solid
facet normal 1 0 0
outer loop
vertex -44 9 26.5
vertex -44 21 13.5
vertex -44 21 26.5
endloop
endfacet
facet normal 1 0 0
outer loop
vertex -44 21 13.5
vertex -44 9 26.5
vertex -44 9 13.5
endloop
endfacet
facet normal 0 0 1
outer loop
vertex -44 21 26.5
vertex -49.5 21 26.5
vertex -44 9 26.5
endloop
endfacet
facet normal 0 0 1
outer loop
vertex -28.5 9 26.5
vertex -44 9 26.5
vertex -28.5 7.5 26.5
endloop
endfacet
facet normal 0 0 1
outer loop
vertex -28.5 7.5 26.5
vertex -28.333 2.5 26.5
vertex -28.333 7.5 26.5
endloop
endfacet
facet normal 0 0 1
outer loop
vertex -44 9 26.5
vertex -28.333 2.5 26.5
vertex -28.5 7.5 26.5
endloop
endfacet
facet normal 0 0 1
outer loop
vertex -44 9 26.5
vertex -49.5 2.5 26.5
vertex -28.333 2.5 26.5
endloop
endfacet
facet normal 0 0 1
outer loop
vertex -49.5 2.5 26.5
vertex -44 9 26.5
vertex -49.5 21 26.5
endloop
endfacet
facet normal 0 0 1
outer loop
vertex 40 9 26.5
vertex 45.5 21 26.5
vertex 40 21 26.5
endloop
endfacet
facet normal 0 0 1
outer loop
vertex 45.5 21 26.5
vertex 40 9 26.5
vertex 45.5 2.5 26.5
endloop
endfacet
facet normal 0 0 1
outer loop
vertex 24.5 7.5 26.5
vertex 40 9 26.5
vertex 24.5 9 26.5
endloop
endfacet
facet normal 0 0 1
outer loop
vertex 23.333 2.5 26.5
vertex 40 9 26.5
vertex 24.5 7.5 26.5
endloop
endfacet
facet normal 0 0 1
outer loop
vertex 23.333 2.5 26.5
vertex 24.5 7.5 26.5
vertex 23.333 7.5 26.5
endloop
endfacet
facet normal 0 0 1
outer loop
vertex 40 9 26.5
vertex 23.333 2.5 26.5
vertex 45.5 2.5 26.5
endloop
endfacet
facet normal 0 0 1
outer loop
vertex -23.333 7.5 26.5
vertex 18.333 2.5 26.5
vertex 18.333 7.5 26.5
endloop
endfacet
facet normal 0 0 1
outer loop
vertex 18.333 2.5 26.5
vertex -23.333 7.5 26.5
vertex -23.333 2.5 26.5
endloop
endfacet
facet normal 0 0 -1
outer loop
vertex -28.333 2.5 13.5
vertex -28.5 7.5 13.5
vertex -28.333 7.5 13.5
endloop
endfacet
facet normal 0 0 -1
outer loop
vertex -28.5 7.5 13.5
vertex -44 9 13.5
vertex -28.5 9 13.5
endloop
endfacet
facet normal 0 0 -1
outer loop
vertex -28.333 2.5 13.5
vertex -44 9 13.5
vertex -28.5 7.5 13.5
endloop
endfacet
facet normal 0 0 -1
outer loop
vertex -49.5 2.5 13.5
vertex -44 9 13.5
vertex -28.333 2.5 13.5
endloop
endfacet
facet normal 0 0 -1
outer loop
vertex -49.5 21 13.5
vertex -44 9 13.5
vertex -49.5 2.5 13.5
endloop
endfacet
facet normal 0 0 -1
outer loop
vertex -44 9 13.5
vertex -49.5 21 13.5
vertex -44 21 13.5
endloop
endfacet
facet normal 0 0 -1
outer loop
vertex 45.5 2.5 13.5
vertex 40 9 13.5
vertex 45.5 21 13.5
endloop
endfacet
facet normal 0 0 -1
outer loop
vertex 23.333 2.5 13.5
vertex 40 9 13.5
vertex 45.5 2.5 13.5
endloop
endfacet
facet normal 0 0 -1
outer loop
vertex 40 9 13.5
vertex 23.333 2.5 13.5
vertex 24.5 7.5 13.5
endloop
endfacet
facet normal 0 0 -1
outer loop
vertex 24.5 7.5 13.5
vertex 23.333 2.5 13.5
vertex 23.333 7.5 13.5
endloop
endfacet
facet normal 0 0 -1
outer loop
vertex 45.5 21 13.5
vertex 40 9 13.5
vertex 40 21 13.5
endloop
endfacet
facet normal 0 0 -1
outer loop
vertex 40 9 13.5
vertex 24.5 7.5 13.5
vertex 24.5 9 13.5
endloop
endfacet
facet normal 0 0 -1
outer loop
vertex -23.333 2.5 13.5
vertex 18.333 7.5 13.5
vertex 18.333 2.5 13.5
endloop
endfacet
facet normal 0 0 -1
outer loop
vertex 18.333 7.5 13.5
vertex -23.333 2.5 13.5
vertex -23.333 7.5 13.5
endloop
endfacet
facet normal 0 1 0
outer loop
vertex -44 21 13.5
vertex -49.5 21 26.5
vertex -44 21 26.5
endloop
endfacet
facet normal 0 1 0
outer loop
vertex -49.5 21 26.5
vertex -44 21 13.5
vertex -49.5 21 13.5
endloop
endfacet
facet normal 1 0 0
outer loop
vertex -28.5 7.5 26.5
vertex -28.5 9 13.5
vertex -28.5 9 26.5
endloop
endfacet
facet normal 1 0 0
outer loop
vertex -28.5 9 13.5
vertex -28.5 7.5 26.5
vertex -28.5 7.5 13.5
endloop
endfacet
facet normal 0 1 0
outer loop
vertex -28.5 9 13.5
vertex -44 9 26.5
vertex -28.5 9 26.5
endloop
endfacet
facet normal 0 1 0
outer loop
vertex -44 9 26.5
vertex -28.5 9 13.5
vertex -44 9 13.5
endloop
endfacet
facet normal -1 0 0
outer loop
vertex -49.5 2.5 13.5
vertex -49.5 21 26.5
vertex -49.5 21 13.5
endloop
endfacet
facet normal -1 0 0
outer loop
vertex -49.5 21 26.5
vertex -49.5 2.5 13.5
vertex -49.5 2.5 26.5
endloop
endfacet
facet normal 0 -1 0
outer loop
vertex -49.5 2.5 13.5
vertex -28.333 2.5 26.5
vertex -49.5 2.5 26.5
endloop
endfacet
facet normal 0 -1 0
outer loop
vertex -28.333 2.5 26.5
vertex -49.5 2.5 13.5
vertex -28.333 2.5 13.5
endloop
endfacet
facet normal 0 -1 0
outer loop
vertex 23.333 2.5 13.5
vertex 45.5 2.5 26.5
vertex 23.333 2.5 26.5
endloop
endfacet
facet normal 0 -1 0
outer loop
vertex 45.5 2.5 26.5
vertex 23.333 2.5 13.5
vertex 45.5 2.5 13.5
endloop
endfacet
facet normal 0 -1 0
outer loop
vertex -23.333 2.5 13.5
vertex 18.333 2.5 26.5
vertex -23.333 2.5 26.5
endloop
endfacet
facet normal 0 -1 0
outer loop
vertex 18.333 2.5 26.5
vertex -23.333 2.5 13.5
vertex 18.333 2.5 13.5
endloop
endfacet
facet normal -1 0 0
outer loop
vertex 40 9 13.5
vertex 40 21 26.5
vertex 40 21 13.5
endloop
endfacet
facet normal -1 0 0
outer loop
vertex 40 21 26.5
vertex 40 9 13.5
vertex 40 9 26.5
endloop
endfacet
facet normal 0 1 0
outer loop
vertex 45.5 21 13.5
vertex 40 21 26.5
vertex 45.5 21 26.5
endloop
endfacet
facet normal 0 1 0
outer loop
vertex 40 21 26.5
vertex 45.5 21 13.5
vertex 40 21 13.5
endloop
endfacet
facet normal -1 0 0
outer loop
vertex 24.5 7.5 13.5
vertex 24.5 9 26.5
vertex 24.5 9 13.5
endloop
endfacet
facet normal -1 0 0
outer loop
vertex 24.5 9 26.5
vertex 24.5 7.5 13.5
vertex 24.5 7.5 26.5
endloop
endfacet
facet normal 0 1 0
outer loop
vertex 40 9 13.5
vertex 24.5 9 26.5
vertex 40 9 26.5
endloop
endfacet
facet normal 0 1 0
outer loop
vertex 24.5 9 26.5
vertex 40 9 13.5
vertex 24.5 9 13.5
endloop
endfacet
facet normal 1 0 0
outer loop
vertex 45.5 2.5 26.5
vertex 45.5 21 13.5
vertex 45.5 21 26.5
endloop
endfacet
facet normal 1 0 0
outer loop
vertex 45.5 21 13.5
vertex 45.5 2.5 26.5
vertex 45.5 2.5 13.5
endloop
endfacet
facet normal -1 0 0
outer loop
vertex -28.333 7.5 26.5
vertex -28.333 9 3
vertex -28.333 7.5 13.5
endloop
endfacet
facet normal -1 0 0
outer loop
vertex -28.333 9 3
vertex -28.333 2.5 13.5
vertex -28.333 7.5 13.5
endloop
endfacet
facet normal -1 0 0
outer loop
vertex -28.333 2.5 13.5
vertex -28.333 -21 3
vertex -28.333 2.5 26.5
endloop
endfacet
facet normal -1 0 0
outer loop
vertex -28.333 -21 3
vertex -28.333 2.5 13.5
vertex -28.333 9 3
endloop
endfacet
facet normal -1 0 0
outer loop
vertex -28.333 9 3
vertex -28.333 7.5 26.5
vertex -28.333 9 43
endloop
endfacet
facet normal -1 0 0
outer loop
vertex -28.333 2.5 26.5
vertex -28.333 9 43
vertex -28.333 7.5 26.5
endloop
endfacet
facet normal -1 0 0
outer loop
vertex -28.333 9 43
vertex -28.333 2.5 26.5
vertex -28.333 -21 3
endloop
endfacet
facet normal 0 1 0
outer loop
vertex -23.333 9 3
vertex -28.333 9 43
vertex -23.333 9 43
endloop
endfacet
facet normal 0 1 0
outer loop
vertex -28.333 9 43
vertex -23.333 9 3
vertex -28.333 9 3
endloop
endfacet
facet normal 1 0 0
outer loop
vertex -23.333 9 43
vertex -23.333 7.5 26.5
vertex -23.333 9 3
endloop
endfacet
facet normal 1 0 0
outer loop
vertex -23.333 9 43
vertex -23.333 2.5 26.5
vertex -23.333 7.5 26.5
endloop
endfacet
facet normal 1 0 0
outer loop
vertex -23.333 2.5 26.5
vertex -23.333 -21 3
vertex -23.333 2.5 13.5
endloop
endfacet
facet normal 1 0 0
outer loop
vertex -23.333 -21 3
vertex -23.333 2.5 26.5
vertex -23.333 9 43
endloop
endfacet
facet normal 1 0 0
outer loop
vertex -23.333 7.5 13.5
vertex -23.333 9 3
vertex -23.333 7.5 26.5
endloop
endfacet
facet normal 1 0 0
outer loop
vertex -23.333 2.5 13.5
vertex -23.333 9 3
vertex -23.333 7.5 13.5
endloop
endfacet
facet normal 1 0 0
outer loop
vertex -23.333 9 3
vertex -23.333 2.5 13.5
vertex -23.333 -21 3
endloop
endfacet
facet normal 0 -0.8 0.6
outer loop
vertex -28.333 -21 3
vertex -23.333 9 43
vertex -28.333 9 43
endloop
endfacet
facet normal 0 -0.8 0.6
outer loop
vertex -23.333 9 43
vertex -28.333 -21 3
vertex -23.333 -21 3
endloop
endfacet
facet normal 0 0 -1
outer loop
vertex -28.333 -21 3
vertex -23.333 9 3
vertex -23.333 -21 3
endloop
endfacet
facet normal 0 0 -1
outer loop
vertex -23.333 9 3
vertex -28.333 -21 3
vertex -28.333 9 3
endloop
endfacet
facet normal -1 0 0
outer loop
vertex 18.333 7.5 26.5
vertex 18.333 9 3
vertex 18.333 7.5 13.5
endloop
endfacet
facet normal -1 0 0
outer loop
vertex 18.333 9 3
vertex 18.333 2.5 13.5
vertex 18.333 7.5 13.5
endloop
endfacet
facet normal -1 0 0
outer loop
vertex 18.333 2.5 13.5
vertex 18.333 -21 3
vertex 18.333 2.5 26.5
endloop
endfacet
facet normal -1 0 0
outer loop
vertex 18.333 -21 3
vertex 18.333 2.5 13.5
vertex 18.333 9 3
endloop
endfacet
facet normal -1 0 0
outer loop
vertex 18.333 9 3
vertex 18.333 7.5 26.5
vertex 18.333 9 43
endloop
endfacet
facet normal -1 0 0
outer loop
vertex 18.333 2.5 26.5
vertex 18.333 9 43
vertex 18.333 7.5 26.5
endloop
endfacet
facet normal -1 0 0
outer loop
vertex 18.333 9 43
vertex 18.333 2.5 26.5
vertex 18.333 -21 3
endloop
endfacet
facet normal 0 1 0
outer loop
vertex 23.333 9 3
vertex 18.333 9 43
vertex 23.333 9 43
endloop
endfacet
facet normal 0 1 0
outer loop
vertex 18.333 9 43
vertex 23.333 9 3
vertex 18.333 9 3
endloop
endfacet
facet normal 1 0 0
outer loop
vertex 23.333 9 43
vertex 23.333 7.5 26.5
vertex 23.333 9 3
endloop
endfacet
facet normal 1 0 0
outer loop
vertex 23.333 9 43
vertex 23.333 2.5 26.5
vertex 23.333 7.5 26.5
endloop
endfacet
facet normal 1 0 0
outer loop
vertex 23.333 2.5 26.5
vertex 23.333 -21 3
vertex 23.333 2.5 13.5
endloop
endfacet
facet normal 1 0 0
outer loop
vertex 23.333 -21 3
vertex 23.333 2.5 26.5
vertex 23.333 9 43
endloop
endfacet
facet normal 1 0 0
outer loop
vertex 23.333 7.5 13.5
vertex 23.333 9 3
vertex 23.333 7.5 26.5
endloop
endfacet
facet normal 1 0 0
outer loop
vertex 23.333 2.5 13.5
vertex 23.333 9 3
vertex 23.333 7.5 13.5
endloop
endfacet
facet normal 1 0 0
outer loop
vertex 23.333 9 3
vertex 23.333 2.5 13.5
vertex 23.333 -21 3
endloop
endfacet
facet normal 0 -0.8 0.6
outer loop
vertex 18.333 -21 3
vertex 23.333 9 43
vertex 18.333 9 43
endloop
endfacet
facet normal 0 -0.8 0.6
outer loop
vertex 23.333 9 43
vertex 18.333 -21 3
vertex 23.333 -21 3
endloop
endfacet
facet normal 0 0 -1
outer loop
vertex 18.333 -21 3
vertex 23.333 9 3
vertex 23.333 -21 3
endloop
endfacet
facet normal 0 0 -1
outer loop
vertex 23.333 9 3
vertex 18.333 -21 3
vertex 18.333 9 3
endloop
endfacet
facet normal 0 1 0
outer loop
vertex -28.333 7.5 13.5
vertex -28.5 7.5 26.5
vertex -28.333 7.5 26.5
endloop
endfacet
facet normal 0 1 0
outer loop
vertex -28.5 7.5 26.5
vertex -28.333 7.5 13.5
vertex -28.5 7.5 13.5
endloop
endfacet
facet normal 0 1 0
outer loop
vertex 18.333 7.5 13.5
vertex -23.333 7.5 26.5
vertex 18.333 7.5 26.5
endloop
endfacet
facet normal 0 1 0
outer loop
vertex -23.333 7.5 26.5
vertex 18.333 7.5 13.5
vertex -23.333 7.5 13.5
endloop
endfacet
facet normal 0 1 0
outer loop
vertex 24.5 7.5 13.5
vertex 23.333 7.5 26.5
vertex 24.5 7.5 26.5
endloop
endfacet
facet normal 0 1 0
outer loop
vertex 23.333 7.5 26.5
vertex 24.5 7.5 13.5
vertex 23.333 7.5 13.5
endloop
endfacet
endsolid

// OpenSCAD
// file: support_angle.scad
include <../robot_settings.scad>

module support_angle(height = 20, width = 5, depth = 20)
{
    // ===============================
    // Parametric Pythagorean Triangle Cube
    // ===============================

    // Triangle legs
    a = height;   // length of first leg
    b = depth;   // length of second leg

    // Extrusion thickness (depth of the "cube")
    thickness = width;

    // Hypotenuse (computed automatically)
    c = sqrt(a*a + b*b);

    // 2D right triangle
    module right_triangle(a, b) {
        polygon(points=[
            [0,0],
            [a,0],
            [0,b]
        ]);
    }

    // 3D prism from the triangle
    module pythagorean_prism(a, b, thickness) {
        linear_extrude(height = thickness)
            right_triangle(a, b);
    }

    rotate([90, -90, -90])
    // Render the model
    pythagorean_prism(a, b, thickness);

    // Optional: print hypotenuse to console
   // echo("Hypotenuse =", c);

}
support_angle();
// file: ../robot_settings.scad
main_box_x = 100; // 96
main_box_y = 102;
main_box_z = 74; // 74.5

lfp_main_box_x = 65;
lfp_main_box_y = 152;
lfp_main_box_z = 94;

wall_thickness = 5;

rail_gap = 2;
rail_inset = 7;

rail_thickness = 7;
rail_length = 250;
 rail_width = 260;

lfp_battery_width = 65.5;
lfp_battery_depth = 150.5;
lfp_battery_height = 93;
lfp_battery_midterrace_width = 64.8;
lfp_battery_midterrace_depth = 150.2;
lfp_battery_midterrace_height = 7.8;
lfp_battery_topterrace_width = 62.8;
lfp_battery_topterrace_depth = 149.4;
lfp_battery_topterrace_height = 6.6;

// red right
// black left
lfp_battery_terminal_width = 9.2;
lfp_battery_terminal_depth = 9.5;
lfp_battery_terminal_depth_setback = 4.4;
lfp_battery_terminal_width_setback = 5.9;

raspberry_pi_screw_seperation_y = 57;
raspberry_pi_screw_seperation_z = 48;
raspberry_pi_peg_h = 5;

battery_box_peg_h = 6;
battery_box_peg_d = 9.5;
battery_box_peg_cutout = 5;

gears_module = 1;
pinion_gear_teeth = 32;
pinion_gear_width = 5;
pinion_gear_bore = 8;

gears_setback_distance = 25;
gear_post_height = 2 * pinion_gear_width + rail_thickness + 8 ;

steering_motor_mount_x = 45;
steering_motor_mount_y = 36;
steering_motor_mount_z = 18;
steering_motor_mount_setback_distance = gears_setback_distance + 16;

dc_motor_drivertype = "Teyleten"; // Teyleten
isAdafruit = (dc_motor_drivertype == "Adafruit");

drv8871_x = isAdafruit ? 20.3 : 21.6;
drv8871_y = isAdafruit ?  24 : 25;

drv8871_z = 2;
drv8871_screw_d = 2.5;
drv8871_solder_points_z = 2;

drv8871mount_edge_x = 1.5;
drv8871mount_edge_wall = 3;
drv8871mount_z = 5;
drv8871mount_x = drv8871_x +  drv8871mount_edge_wall - 2* drv8871mount_edge_x;
drv8871mount_y = 19;

drv8871_screw_distance = 15.64;
drv8871_solder_points_d = 1.66;
drv8871_solder_offset_y = 4.4;
drv8871_solder_inner_points_distance = 5;
drv8871_solder_outer_points_distance = 12;

dc_motor_75_1_encoder_z = 14.75;
dc_motor_75_1_encoder_d = 24.5;
dc_motor_75_1_housing_z = 30;
dc_motor_75_1_housing_d = 24.1;
dc_motor_75_1_gearbox_z = 23;
dc_motor_75_1_gearbox_d = 24.8;
dc_motor_75_1_z = dc_motor_75_1_encoder_z + dc_motor_75_1_housing_z + dc_motor_75_1_gearbox_z;

dc_motor_housing_minus_encoder_z = 48;
dc_motor_encoder_z = 9.33;
dc_motor_encoder_wheel_d = 13.4;
dc_motor_encoder_wheel_thickness = 5;
dc_motor_encoder_wheel_gap = 3;
dc_motor_encoder_circuit_thickness = 2;
dc_motor_z = dc_motor_housing_minus_encoder_z + dc_motor_encoder_z + dc_motor_encoder_wheel_thickness + dc_motor_encoder_wheel_gap + dc_motor_encoder_circuit_thickness;
dc_motor_cutout_d = 24.8;
dc_motor_cutout_z = 19.5;


M3_shaft_d = 2.82;

dc_motor_screw_head_z = 2;
dc_motor_screw_head_d = 5.6;
dc_motor_screw_d = 3.2;
dc_motor_screw_offset = 8.5;

dc_motor_axle_ring_z = 3;
dc_motor_axle_ring_d = 7.2;
dc_motor_axle_cutout_d = 4.2;
dc_motor_axle_cutout_z = 10;
dc_motor_axle_notch_cutout = 0.4;
dc_motor_axle_notch_cutout_z = 6;

pdmount_x = 20;
pdmount_y = 30;
pdmount_z = 2;
pdmount_edge_x = 1.5;
pdmount_edge_wall = 3;

steering_shaft_z = 45;
steering_shaft_d = 7;
steering_shaft_motor_fitting_d = 9;
coupler_length = 24.6;
coupler_diameter = 14;
coupler_screw_d = 4;
coupler_screw_z_offset = 5;
coupler_gear_side_insert = 12.6;
steering_shaft_with_coupler_z = steering_shaft_z - coupler_gear_side_insert;

lidar_mount_y = 110;
lidar_mount_x = 65 + 20;
lidar_narrow_screws = 40;
lidar_wide_screws = 56;
lidar_front_to_back_screws = 70;
lidar_screw_d = 3;
lidar_circuitboard_x = 20;
lidar_circuitboard_y = 35;
lidar_circuitboard_z = 1.2;
lidar_cord_length = 29;

ball_bearing_height = 7;
ball_bearing_outer_diameter = 22;
ball_bearing_inner_diameter = 8;

M4_diameter = 5.1;
M3_diameter = 2.9;
M3_length = 35;
M3_cap_length= 3;
M3_cap_diameter = 5.44;

suspension_spring_outer_diameter = 8;
suspension_spring_inner_diameter = 5.3;

armature_holder_height = 20;
armature_holder_thickness = 8;
pull_bar_peg_r = 3.2;
apparatus_locking_peg_d = 4;

rack_module = 1;
rack_length = main_box_x;
rack_height = 5;
rack_width = 10;
rack_teeth = 30;
rack_bore = 3;

pull_bar_length = rail_width / 2 - rack_length + 1;

// tire hardware
axle_length = 24 + ball_bearing_height; 
axle_reciever_inner_diameter = 8.2;
axle_reciever_outer_diameter = 12;
axle_reciever_length = 18.8;
axle_notch_length = 15;
axle_notch_cutout = 2.4;

// power distribution bar
power_bar_cutout_x = 96;
power_bar_y = 19.1;
power_bar_z = 1.5;
power_bar_screw_distance = 91.4;
power_bar_screw_d = 2.8;
power_bar_standoff_z = 5;
power_bar_standoff_d = 6.83;

pico_expander_width = 63;
pico_expander_height = 57;
pico_screw_hole_offset = 3;
pico_screw_hole_d = 2.5;

usbhub_thickness = 11.7;
usbhub_depth = 37.5;
usbhub_width = 86.7;
usbhub_end_port_width = 14.8;
usbhub_end_port_height = 12;
usbhub_front_face_safe_zone_left = 15;
usbhub_front_face_safe_zone_right = 14.8;

switch_w = 16;
switch_cutout_d = 12.2;
switch_bump_h = 2;
switch_bump_l = 18.2;

i2c_mount_thickness = 3;
i2c_w = 28;
i2c_l = 28;
i2c_circuitboard_thickness = 1.23;
i2c_bottom_notch_w = 14.35;
i2c_bottom_notch_depth = 1;
i2c_screw_hole_d = 1.9;
i2c_screw_hole_offset = 1.4;
i2c_pin_l = 11;
i2c_pin_d = 0.8;
i2c_pin_offset = 1.5;
i2c_pin_separation = 2.5;
i2c_all_pins_l = 8.3;
i2c_screen_thickness = 1.88;
i2c_screen_w = 14.6;
i2c_screen_d = 27;
i2c_screen_offset = 4.1;
// main file
include <../robot_settings.scad>
use <support_angle.scad>

module battery_box_support(width = 25)
{
      // battery box support right
      translate([-main_box_x / 3 + 5,  9, 3])
      rotate([0, 0, 180])
      support_angle(height = 40, depth = 30);
  
      // battery box support right
      translate([main_box_x / 3 - 15, 9, 3])
      rotate([0, 0, 180])
      support_angle(height = 40, depth = 30);
      
      // cross bar for side support
      translate([-2, 5, 20])
      cube([lfp_main_box_x +  width, 5, 13], center = true);
      
      // left side support
      color("green")
      translate([- lfp_main_box_x /2  - .5 - width / 2, 13.5, 20]) {
        cube([3, 15, 13], center = true);
        translate([9, -6, 0])
        cube([16, 3, 13], center = true);
        translate([-2.5, -1.75, 0])
        cube([3, 18.5, 13], center = true);
      }
          
      // right side support
      color("red")
      translate([lfp_main_box_x / 2 - 3.5 + width / 2, 13.5, 20]) {
        cube([3, 15, 13], center = true);
        translate([-9, -6, 0])
        cube([16, 3, 13], center = true);
        translate([2.5, -1.75, 0])
        cube([3, 18.5, 13], center = true);      }
    }
    battery_box_support();
